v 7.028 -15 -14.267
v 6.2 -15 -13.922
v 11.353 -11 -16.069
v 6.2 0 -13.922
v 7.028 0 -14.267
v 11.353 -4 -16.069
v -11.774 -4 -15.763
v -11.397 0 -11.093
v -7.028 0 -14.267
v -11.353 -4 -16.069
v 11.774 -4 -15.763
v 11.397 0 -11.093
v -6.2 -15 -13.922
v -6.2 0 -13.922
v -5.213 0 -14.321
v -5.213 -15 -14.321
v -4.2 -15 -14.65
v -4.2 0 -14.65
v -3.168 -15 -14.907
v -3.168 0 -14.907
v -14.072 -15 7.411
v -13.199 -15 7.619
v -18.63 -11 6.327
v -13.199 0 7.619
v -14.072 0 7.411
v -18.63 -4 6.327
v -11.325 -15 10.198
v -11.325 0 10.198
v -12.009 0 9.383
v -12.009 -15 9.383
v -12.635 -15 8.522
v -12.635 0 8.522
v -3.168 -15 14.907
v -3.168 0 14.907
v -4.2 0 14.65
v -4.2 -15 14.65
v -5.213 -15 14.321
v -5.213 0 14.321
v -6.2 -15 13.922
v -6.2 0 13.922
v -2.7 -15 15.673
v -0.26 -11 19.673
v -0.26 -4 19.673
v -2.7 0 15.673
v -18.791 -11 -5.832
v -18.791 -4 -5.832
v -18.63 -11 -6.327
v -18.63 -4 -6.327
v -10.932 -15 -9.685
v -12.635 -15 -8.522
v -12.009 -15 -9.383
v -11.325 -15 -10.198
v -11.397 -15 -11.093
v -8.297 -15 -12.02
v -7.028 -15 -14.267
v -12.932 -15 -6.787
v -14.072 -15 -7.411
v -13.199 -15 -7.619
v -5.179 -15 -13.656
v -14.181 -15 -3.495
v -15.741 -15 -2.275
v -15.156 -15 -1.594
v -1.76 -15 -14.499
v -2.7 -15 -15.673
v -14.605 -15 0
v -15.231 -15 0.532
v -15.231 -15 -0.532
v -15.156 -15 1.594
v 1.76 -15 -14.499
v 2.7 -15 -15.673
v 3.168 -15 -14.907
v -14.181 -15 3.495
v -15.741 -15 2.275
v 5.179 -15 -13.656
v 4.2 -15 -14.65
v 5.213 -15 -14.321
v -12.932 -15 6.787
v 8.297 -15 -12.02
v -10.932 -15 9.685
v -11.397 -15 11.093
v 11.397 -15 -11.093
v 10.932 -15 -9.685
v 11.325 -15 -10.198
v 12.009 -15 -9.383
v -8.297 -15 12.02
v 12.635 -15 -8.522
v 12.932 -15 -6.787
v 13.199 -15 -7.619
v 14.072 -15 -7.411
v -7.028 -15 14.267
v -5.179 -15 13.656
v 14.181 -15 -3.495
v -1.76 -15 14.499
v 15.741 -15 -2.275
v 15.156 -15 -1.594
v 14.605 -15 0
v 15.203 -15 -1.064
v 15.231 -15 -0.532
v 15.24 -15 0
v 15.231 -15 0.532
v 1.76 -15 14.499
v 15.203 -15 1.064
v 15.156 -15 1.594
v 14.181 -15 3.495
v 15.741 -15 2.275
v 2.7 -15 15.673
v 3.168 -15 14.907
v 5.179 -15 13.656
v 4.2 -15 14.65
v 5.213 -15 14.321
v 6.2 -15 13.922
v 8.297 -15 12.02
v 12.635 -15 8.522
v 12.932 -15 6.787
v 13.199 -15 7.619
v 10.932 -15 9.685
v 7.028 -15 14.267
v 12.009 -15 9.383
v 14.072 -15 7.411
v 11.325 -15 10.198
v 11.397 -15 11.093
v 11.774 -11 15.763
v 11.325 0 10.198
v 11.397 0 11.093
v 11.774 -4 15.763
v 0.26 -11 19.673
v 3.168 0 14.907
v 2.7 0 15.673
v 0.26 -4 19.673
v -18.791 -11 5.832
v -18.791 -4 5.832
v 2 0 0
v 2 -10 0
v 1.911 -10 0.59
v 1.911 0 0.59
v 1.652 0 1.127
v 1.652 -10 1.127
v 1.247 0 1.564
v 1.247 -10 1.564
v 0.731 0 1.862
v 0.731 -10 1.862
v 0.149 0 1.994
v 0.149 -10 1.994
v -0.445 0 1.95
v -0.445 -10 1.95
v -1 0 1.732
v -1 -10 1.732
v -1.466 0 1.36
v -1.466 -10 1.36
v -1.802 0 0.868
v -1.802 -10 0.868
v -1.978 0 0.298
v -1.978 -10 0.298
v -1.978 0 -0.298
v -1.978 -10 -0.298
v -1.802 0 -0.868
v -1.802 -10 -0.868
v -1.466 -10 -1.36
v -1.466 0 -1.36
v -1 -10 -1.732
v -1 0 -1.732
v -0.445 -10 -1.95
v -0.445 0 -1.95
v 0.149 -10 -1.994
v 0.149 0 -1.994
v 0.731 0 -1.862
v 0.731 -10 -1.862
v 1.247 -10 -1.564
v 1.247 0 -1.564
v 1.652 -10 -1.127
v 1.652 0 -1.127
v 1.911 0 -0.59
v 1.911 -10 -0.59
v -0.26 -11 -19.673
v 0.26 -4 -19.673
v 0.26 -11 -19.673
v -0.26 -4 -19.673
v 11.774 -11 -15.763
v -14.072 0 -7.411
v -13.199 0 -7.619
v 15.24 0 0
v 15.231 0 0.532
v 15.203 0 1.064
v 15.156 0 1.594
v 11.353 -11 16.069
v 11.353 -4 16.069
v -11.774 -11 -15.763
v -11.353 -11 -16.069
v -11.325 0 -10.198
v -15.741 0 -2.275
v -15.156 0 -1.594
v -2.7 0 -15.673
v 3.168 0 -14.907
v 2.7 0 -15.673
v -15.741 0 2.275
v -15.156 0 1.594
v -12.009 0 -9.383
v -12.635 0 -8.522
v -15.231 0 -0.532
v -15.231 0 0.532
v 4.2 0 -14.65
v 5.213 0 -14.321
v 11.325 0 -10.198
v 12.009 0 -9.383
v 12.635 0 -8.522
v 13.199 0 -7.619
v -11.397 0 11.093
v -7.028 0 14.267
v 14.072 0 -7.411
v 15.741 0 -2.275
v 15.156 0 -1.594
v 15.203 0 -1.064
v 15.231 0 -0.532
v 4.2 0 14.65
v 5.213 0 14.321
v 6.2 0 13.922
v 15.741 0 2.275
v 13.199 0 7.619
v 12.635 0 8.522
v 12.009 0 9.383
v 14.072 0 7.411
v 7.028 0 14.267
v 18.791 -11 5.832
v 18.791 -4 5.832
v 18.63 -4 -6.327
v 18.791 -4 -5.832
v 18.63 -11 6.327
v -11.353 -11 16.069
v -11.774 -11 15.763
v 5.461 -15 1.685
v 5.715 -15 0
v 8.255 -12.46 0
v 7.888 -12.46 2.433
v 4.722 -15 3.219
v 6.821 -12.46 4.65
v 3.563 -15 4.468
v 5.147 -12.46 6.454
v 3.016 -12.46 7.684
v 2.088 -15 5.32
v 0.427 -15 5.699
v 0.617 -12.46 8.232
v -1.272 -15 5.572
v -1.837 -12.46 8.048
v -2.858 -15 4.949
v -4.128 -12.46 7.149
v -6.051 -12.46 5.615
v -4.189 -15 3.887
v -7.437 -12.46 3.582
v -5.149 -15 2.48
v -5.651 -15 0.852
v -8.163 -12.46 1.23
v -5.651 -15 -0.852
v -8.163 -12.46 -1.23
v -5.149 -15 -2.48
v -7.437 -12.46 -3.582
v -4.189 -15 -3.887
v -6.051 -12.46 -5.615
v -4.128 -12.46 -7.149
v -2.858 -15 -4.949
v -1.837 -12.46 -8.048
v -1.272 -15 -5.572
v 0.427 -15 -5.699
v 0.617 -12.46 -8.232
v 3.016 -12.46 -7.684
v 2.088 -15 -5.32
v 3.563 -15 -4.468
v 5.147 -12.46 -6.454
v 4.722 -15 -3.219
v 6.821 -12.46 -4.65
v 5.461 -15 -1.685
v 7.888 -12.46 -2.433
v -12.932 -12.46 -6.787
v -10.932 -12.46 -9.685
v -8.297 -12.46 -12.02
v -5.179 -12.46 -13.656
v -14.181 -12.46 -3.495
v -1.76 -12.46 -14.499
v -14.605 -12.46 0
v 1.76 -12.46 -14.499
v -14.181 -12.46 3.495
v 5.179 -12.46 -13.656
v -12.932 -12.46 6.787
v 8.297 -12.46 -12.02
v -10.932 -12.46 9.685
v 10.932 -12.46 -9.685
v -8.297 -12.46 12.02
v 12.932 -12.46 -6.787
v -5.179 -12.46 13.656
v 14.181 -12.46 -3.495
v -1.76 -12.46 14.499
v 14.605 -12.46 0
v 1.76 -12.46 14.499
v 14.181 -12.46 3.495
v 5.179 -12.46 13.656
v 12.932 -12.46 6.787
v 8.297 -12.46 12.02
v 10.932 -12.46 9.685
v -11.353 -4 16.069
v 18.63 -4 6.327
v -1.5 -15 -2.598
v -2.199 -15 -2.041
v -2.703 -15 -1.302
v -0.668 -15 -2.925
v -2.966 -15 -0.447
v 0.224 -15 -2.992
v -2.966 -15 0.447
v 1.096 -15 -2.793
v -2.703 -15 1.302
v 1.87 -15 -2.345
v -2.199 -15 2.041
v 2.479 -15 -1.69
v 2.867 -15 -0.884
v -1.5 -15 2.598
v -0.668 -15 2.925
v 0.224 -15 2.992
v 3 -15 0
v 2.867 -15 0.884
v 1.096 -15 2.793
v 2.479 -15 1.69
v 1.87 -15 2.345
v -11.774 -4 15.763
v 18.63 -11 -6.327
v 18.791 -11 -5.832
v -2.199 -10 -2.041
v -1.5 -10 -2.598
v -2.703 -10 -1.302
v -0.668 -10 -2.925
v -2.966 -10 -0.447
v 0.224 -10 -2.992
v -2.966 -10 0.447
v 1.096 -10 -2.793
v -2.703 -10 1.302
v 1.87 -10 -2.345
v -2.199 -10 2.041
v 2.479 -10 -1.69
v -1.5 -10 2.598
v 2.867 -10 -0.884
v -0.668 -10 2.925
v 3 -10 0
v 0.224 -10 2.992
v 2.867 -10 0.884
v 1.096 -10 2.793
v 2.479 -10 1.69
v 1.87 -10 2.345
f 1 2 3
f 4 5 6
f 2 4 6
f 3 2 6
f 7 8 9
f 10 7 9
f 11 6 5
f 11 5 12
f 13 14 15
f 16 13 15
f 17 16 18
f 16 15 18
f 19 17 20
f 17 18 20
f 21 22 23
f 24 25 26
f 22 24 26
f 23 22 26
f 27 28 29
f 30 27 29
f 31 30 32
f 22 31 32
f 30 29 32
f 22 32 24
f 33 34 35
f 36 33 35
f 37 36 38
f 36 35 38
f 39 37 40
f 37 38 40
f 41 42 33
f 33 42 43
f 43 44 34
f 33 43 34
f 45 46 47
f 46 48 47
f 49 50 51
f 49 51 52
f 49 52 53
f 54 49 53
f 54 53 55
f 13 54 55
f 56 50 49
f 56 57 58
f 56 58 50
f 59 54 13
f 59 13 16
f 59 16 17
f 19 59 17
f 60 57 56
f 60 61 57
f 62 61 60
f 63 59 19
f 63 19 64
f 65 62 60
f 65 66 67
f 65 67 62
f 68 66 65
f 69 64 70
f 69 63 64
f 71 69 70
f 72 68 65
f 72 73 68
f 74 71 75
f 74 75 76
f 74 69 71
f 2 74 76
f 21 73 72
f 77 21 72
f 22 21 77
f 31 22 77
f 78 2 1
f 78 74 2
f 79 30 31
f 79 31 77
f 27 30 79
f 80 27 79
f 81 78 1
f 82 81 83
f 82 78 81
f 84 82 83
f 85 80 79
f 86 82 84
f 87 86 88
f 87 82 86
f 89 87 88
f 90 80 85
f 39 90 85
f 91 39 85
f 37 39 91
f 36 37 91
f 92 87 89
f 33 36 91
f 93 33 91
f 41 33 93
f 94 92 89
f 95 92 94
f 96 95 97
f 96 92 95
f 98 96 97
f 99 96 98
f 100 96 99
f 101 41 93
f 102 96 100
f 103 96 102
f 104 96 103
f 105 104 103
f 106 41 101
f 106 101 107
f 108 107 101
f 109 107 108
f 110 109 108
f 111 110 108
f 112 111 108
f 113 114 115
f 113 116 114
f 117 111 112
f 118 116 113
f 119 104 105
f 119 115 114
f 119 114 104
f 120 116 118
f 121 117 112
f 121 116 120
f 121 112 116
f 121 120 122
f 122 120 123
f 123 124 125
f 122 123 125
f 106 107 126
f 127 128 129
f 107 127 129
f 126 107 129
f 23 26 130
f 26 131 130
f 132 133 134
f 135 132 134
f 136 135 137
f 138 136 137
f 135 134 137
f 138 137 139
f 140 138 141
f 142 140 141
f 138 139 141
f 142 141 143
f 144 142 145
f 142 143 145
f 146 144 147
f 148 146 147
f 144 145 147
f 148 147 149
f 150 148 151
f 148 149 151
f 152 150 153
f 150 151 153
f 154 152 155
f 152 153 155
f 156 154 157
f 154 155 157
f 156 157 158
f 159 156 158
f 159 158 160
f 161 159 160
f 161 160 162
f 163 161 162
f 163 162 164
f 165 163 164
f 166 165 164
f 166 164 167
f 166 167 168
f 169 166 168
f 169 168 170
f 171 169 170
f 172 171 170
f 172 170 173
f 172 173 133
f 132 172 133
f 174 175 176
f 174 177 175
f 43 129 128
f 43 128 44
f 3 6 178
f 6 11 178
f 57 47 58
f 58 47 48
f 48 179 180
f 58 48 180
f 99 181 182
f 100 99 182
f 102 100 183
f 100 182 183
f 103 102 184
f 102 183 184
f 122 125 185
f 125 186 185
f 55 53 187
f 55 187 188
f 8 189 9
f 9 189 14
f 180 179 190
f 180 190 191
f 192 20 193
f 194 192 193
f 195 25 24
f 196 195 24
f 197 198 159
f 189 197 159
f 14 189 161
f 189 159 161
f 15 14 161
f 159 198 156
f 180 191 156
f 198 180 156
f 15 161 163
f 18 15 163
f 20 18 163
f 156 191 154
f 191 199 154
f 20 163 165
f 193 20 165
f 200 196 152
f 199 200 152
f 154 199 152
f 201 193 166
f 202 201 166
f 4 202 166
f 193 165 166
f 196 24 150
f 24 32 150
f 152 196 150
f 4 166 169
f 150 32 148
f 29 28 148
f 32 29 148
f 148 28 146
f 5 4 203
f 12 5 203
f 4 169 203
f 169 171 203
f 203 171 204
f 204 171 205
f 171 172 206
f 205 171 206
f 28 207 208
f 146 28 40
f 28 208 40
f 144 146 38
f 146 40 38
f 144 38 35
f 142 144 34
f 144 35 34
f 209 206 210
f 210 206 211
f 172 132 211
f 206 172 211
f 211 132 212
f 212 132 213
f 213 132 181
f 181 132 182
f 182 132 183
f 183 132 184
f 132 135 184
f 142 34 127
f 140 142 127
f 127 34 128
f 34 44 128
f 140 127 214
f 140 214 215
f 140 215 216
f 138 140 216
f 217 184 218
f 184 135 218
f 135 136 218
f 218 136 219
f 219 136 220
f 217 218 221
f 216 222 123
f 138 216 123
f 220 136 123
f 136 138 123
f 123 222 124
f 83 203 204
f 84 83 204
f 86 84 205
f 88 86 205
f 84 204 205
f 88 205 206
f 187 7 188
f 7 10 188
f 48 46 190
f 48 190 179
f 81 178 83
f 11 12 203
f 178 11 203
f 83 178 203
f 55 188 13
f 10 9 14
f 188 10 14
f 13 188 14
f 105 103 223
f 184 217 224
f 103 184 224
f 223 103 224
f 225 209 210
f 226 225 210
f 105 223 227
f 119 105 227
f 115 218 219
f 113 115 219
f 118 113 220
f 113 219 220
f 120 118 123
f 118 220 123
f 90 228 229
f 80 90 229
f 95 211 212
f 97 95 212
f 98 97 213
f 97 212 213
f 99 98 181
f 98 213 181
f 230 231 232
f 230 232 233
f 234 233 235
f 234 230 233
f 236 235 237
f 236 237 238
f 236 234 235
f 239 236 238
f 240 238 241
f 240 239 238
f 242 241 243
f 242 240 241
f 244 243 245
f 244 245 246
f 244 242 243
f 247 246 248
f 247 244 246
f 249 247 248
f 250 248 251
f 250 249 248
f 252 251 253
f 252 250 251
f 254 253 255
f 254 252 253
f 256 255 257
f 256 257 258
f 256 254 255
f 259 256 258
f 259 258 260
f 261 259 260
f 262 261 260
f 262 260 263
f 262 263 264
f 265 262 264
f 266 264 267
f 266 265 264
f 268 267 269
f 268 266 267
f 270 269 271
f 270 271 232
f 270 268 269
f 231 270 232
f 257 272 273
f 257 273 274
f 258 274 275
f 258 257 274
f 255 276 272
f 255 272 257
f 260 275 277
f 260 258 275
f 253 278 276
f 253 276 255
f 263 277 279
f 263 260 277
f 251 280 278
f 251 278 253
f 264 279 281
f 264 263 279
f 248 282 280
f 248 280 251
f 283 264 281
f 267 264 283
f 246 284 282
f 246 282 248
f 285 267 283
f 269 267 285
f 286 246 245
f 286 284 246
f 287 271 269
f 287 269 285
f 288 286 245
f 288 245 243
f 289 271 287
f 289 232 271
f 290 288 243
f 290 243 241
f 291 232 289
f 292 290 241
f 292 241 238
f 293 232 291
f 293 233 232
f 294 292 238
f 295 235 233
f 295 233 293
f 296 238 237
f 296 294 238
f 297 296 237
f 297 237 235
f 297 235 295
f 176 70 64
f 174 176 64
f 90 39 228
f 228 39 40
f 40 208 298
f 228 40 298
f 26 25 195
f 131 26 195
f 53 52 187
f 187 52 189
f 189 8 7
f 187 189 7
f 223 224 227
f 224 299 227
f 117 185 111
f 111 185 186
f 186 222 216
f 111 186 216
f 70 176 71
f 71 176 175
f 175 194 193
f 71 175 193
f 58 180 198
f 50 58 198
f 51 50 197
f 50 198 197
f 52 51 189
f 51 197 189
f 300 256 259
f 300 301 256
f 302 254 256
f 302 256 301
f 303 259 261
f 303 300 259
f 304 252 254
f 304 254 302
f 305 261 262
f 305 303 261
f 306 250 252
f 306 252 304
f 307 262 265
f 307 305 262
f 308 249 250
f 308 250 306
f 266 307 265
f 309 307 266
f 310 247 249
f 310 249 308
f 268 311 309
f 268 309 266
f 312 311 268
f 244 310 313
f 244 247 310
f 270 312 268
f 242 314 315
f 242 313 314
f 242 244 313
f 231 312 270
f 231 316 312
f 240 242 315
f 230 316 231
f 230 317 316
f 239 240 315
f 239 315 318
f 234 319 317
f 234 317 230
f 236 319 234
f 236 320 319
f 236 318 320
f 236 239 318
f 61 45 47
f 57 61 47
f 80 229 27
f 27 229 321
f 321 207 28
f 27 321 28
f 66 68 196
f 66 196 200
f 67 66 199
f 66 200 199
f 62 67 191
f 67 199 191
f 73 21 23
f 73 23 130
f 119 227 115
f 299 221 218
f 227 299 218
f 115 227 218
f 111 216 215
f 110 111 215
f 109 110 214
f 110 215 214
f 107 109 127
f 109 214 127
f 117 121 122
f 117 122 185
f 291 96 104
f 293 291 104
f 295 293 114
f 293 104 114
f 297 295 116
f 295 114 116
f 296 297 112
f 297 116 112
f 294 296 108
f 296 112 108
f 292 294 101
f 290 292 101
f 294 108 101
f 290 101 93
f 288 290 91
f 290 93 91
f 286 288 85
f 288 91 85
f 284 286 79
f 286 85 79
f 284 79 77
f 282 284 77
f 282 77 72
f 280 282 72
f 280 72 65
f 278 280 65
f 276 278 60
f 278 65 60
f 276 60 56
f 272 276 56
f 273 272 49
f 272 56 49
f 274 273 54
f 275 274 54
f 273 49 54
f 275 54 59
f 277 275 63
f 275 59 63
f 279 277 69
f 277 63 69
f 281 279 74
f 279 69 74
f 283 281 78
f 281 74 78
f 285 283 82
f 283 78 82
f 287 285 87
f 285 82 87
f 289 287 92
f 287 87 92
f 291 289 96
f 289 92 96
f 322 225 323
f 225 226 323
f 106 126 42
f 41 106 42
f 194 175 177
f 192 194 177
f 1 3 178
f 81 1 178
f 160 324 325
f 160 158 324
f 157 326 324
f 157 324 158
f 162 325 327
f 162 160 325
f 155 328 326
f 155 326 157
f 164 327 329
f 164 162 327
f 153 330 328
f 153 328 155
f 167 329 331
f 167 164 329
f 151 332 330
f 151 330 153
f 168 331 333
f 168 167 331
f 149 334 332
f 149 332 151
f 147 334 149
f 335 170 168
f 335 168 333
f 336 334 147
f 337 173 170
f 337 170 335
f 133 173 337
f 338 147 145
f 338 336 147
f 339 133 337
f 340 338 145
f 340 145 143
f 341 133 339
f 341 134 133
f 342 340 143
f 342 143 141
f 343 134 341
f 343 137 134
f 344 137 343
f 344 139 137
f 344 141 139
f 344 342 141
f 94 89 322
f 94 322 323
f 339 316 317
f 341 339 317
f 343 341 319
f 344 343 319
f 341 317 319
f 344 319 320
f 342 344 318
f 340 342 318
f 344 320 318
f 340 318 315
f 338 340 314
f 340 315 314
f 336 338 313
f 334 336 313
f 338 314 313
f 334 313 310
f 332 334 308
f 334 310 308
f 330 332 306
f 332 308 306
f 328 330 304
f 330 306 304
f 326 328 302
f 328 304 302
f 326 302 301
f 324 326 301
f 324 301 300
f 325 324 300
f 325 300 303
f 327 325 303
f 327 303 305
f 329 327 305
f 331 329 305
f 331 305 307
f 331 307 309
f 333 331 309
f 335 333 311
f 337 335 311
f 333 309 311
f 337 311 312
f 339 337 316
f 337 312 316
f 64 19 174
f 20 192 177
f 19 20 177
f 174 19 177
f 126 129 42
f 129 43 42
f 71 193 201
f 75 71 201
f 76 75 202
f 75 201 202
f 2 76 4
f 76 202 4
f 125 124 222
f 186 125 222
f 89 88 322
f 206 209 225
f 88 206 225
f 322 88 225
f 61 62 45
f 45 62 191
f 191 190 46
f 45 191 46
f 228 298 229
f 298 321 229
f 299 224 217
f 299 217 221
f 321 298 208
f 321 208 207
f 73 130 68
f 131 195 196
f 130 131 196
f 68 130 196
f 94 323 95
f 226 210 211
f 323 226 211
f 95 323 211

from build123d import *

# Parameters (mm, degrees)
F1_DEPTH = 15
F2_SIZE  = 0.5
F3_SIZE  = 4
F4_R     = 2
F5_DEPTH = 25.4
F6_R     = 3
F7_DEPTH = 5
F8_R     = 14.605
F8_R_2   = 3.175
F9_DEPTH = 2.54


# Not quite as in the source:
# - a fillet or chamfer that OpenCascade refuses, or shapes differently, is made with other operations: its cross-section is extruded or revolved along the edge and cut away or added


with BuildPart() as f1:
    # F0 (on Front) → F1 (new body)
    with BuildSketch(Plane.XZ):
        with BuildLine():
            Line((0, -20.1), (3.1676147888, -14.9071733253))
            ThreePointArc((3.1676147888, -14.9071733253), (0, -15.24), (-3.1676147888, -14.9071733253))
            Line((-3.1676147888, -14.9071733253), (0, -20.1))
        make_face()
        with BuildLine():
            ThreePointArc((-3.1676147888, 14.9071733253), (0, 15.24), (3.1676147888, 14.9071733253))
            Line((3.1676147888, 14.9071733253), (0, 20.1))
            Line((0, 20.1), (-3.1676147888, 14.9071733253))
        make_face()
        with BuildLine():
            ThreePointArc((-11.3248708297, 10.1982793004), (-8.9578472449, 12.3294189943), (-6.1995624382, 13.922033816))
            Line((-6.1995624382, 13.922033816), (-11.8144835711, 16.2612415869))
            Line((-11.8144835711, 16.2612415869), (-11.3248708297, 10.1982793004))
        make_face()
        with BuildLine():
            ThreePointArc((-15.1564111319, 1.5939892096), (-14.4941013083, 4.7094189943), (-13.1987175292, 7.6191505816))
            Line((-13.1987175292, 7.6191505816), (-19.1162359775, 6.2112415869))
            Line((-19.1162359775, 6.2112415869), (-15.1564111319, 1.5939892096))
        make_face()
        with BuildLine():
            Line((-19.1162359775, -6.2112415869), (-13.1987175292, -7.6191505816))
            ThreePointArc((-13.1987175292, -7.6191505816), (-14.4941013083, -4.7094189943), (-15.1564111319, -1.5939892096))
            Line((-15.1564111319, -1.5939892096), (-19.1162359775, -6.2112415869))
        make_face()
        with BuildLine():
            Line((-11.8144835711, -16.2612415869), (-6.1995624382, -13.922033816))
            ThreePointArc((-6.1995624382, -13.922033816), (-8.9578472449, -12.3294189943), (-11.3248708297, -10.1982793004))
            Line((-11.3248708297, -10.1982793004), (-11.8144835711, -16.2612415869))
        make_face()
        with BuildLine():
            ThreePointArc((15.1564111319, -1.5939892096), (15.2190884361, -0.7980897035), (15.24, 0))
            ThreePointArc((15.24, 0), (15.2190884361, 0.7980897035), (15.1564111319, 1.5939892096))
            ThreePointArc((15.1564111319, 1.5939892096), (14.4941013083, 4.7094189943), (13.1987175292, 7.6191505816))
            ThreePointArc((13.1987175292, 7.6191505816), (12.3294189943, 8.9578472449), (11.3248708297, 10.1982793004))
            ThreePointArc((11.3248708297, 10.1982793004), (8.9578472449, 12.3294189943), (6.1995624382, 13.922033816))
            ThreePointArc((6.1995624382, 13.922033816), (4.7094189943, 14.4941013083), (3.1676147888, 14.9071733253))
            ThreePointArc((3.1676147888, 14.9071733253), (0, 15.24), (-3.1676147888, 14.9071733253))
            ThreePointArc((-3.1676147888, 14.9071733253), (-4.7094189943, 14.4941013083), (-6.1995624382, 13.922033816))
            ThreePointArc((-6.1995624382, 13.922033816), (-8.9578472449, 12.3294189943), (-11.3248708297, 10.1982793004))
            ThreePointArc((-11.3248708297, 10.1982793004), (-12.3294189943, 8.9578472449), (-13.1987175292, 7.6191505816))
            ThreePointArc((-13.1987175292, 7.6191505816), (-14.4941013083, 4.7094189943), (-15.1564111319, 1.5939892096))
            ThreePointArc((-15.1564111319, 1.5939892096), (-15.24, 0), (-15.1564111319, -1.5939892096))
            ThreePointArc((-15.1564111319, -1.5939892096), (-14.4941013083, -4.7094189943), (-13.1987175292, -7.6191505816))
            ThreePointArc((-13.1987175292, -7.6191505816), (-12.3294189943, -8.9578472449), (-11.3248708297, -10.1982793004))
            ThreePointArc((-11.3248708297, -10.1982793004), (-8.9578472449, -12.3294189943), (-6.1995624382, -13.922033816))
            ThreePointArc((-6.1995624382, -13.922033816), (-4.7094189943, -14.4941013083), (-3.1676147888, -14.9071733253))
            ThreePointArc((-3.1676147888, -14.9071733253), (0, -15.24), (3.1676147888, -14.9071733253))
            ThreePointArc((3.1676147888, -14.9071733253), (4.7094189943, -14.4941013083), (6.1995624382, -13.922033816))
            ThreePointArc((6.1995624382, -13.922033816), (8.9578472449, -12.3294189943), (11.3248708297, -10.1982793004))
            ThreePointArc((11.3248708297, -10.1982793004), (12.3294189943, -8.9578472449), (13.1987175292, -7.6191505816))
            ThreePointArc((13.1987175292, -7.6191505816), (14.4941013083, -4.7094189943), (15.1564111319, -1.5939892096))
        make_face()
        with BuildLine():
            ThreePointArc((6.1995624382, 13.922033816), (8.9578472449, 12.3294189943), (11.3248708297, 10.1982793004))
            Line((11.3248708297, 10.1982793004), (11.8144835711, 16.2612415869))
            Line((11.8144835711, 16.2612415869), (6.1995624382, 13.922033816))
        make_face()
        with BuildLine():
            ThreePointArc((13.1987175292, 7.6191505816), (14.4941013083, 4.7094189943), (15.1564111319, 1.5939892096))
            Line((15.1564111319, 1.5939892096), (19.1162359775, 6.2112415869))
            Line((19.1162359775, 6.2112415869), (13.1987175292, 7.6191505816))
        make_face()
        with BuildLine():
            Line((19.1162359775, -6.2112415869), (15.1564111319, -1.5939892096))
            ThreePointArc((15.1564111319, -1.5939892096), (14.4941013083, -4.7094189943), (13.1987175292, -7.6191505816))
            Line((13.1987175292, -7.6191505816), (19.1162359775, -6.2112415869))
        make_face()
        with BuildLine():
            Line((11.8144835711, -16.2612415869), (11.3248708297, -10.1982793004))
            ThreePointArc((11.3248708297, -10.1982793004), (8.9578472449, -12.3294189943), (6.1995624382, -13.922033816))
            Line((6.1995624382, -13.922033816), (11.8144835711, -16.2612415869))
        make_face()
    extrude(amount=F1_DEPTH)

    # F2
    f2_edges = [f1.edges().sort_by_distance(p)[0] for p in [
        (0, -7.5, -20.1),
        (0, -7.5, 20.1),
        (-11.814484, -7.5, -16.261242),
        (-19.116236, -7.5, -6.211242),
        (-19.116236, -7.5, 6.211242),
        (-11.814484, -7.5, 16.261242),
        (11.814484, -7.5, 16.261242),
        (19.116236, -7.5, 6.211242),
        (19.116236, -7.5, -6.211242),
        (11.814484, -7.5, -16.261242),
    ]]
    chamfer(f2_edges, length=F2_SIZE)

    # F3
    f3_edges = [f1.edges().sort_by_distance(p)[0] for p in [
        (-11.563586, -15, 15.915911),
        (-11.563586, 0, 15.915911),
        (0, 0, 19.673148),
        (0, -15, 19.673148),
        (0, -15, -19.673148),
        (-11.563586, -15, -15.915911),
        (-18.710275, -15, -6.079337),
        (-18.710275, -15, 6.079337),
        (-18.710275, 0, 6.079337),
        (-18.710275, 0, -6.079337),
        (-11.563586, 0, -15.915911),
        (0, 0, -19.673148),
        (11.563586, -15, 15.915911),
        (18.710275, -15, 6.079337),
        (18.710275, -15, -6.079337),
        (11.563586, -15, -15.915911),
        (11.563586, 0, 15.915911),
        (18.710275, 0, 6.079337),
        (18.710275, 0, -6.079337),
        (11.563586, 0, -15.915911),
    ]]
    chamfer(f3_edges, length=F3_SIZE)

    # F4 (on face) → F5 (cut)
    with BuildSketch(Plane.XZ.offset(15)):
        Circle(F4_R)
    extrude(amount=-F5_DEPTH, mode=Mode.SUBTRACT)

    # F6 (on face) → F7 (cut)
    with BuildSketch(Plane.XZ.offset(15)):
        Circle(F6_R)
    extrude(amount=-F7_DEPTH, mode=Mode.SUBTRACT)

    # F8 (on face) → F9 (cut)
    with BuildSketch(Plane.XZ.offset(15)):
        Circle(F8_R)
        Circle(F8_R_2, mode=Mode.SUBTRACT)
    extrude(amount=-F9_DEPTH, mode=Mode.SUBTRACT)

    # F10: chamfer of 5.08 on 1 edges, made by hand


with BuildPart() as f10_tool2:
    # F10_s3 → F10_t4 (revolve)
    with BuildSketch(Plane.XY):
        Polygon((8.255, -12.46), (3.175, -17.54), (3.175, -12.46), align=None)
    revolve(axis=Axis((0, -12.46, 0), (0, -1, 0)))

    split(bisect_by=Plane.XZ.offset(15), keep=Keep.BOTTOM)


with BuildPart() as f1_1:
    add(f1.part)

    # F10_t1: union F10_tool2
    add(f10_tool2.part)


solid = f1_1.part
